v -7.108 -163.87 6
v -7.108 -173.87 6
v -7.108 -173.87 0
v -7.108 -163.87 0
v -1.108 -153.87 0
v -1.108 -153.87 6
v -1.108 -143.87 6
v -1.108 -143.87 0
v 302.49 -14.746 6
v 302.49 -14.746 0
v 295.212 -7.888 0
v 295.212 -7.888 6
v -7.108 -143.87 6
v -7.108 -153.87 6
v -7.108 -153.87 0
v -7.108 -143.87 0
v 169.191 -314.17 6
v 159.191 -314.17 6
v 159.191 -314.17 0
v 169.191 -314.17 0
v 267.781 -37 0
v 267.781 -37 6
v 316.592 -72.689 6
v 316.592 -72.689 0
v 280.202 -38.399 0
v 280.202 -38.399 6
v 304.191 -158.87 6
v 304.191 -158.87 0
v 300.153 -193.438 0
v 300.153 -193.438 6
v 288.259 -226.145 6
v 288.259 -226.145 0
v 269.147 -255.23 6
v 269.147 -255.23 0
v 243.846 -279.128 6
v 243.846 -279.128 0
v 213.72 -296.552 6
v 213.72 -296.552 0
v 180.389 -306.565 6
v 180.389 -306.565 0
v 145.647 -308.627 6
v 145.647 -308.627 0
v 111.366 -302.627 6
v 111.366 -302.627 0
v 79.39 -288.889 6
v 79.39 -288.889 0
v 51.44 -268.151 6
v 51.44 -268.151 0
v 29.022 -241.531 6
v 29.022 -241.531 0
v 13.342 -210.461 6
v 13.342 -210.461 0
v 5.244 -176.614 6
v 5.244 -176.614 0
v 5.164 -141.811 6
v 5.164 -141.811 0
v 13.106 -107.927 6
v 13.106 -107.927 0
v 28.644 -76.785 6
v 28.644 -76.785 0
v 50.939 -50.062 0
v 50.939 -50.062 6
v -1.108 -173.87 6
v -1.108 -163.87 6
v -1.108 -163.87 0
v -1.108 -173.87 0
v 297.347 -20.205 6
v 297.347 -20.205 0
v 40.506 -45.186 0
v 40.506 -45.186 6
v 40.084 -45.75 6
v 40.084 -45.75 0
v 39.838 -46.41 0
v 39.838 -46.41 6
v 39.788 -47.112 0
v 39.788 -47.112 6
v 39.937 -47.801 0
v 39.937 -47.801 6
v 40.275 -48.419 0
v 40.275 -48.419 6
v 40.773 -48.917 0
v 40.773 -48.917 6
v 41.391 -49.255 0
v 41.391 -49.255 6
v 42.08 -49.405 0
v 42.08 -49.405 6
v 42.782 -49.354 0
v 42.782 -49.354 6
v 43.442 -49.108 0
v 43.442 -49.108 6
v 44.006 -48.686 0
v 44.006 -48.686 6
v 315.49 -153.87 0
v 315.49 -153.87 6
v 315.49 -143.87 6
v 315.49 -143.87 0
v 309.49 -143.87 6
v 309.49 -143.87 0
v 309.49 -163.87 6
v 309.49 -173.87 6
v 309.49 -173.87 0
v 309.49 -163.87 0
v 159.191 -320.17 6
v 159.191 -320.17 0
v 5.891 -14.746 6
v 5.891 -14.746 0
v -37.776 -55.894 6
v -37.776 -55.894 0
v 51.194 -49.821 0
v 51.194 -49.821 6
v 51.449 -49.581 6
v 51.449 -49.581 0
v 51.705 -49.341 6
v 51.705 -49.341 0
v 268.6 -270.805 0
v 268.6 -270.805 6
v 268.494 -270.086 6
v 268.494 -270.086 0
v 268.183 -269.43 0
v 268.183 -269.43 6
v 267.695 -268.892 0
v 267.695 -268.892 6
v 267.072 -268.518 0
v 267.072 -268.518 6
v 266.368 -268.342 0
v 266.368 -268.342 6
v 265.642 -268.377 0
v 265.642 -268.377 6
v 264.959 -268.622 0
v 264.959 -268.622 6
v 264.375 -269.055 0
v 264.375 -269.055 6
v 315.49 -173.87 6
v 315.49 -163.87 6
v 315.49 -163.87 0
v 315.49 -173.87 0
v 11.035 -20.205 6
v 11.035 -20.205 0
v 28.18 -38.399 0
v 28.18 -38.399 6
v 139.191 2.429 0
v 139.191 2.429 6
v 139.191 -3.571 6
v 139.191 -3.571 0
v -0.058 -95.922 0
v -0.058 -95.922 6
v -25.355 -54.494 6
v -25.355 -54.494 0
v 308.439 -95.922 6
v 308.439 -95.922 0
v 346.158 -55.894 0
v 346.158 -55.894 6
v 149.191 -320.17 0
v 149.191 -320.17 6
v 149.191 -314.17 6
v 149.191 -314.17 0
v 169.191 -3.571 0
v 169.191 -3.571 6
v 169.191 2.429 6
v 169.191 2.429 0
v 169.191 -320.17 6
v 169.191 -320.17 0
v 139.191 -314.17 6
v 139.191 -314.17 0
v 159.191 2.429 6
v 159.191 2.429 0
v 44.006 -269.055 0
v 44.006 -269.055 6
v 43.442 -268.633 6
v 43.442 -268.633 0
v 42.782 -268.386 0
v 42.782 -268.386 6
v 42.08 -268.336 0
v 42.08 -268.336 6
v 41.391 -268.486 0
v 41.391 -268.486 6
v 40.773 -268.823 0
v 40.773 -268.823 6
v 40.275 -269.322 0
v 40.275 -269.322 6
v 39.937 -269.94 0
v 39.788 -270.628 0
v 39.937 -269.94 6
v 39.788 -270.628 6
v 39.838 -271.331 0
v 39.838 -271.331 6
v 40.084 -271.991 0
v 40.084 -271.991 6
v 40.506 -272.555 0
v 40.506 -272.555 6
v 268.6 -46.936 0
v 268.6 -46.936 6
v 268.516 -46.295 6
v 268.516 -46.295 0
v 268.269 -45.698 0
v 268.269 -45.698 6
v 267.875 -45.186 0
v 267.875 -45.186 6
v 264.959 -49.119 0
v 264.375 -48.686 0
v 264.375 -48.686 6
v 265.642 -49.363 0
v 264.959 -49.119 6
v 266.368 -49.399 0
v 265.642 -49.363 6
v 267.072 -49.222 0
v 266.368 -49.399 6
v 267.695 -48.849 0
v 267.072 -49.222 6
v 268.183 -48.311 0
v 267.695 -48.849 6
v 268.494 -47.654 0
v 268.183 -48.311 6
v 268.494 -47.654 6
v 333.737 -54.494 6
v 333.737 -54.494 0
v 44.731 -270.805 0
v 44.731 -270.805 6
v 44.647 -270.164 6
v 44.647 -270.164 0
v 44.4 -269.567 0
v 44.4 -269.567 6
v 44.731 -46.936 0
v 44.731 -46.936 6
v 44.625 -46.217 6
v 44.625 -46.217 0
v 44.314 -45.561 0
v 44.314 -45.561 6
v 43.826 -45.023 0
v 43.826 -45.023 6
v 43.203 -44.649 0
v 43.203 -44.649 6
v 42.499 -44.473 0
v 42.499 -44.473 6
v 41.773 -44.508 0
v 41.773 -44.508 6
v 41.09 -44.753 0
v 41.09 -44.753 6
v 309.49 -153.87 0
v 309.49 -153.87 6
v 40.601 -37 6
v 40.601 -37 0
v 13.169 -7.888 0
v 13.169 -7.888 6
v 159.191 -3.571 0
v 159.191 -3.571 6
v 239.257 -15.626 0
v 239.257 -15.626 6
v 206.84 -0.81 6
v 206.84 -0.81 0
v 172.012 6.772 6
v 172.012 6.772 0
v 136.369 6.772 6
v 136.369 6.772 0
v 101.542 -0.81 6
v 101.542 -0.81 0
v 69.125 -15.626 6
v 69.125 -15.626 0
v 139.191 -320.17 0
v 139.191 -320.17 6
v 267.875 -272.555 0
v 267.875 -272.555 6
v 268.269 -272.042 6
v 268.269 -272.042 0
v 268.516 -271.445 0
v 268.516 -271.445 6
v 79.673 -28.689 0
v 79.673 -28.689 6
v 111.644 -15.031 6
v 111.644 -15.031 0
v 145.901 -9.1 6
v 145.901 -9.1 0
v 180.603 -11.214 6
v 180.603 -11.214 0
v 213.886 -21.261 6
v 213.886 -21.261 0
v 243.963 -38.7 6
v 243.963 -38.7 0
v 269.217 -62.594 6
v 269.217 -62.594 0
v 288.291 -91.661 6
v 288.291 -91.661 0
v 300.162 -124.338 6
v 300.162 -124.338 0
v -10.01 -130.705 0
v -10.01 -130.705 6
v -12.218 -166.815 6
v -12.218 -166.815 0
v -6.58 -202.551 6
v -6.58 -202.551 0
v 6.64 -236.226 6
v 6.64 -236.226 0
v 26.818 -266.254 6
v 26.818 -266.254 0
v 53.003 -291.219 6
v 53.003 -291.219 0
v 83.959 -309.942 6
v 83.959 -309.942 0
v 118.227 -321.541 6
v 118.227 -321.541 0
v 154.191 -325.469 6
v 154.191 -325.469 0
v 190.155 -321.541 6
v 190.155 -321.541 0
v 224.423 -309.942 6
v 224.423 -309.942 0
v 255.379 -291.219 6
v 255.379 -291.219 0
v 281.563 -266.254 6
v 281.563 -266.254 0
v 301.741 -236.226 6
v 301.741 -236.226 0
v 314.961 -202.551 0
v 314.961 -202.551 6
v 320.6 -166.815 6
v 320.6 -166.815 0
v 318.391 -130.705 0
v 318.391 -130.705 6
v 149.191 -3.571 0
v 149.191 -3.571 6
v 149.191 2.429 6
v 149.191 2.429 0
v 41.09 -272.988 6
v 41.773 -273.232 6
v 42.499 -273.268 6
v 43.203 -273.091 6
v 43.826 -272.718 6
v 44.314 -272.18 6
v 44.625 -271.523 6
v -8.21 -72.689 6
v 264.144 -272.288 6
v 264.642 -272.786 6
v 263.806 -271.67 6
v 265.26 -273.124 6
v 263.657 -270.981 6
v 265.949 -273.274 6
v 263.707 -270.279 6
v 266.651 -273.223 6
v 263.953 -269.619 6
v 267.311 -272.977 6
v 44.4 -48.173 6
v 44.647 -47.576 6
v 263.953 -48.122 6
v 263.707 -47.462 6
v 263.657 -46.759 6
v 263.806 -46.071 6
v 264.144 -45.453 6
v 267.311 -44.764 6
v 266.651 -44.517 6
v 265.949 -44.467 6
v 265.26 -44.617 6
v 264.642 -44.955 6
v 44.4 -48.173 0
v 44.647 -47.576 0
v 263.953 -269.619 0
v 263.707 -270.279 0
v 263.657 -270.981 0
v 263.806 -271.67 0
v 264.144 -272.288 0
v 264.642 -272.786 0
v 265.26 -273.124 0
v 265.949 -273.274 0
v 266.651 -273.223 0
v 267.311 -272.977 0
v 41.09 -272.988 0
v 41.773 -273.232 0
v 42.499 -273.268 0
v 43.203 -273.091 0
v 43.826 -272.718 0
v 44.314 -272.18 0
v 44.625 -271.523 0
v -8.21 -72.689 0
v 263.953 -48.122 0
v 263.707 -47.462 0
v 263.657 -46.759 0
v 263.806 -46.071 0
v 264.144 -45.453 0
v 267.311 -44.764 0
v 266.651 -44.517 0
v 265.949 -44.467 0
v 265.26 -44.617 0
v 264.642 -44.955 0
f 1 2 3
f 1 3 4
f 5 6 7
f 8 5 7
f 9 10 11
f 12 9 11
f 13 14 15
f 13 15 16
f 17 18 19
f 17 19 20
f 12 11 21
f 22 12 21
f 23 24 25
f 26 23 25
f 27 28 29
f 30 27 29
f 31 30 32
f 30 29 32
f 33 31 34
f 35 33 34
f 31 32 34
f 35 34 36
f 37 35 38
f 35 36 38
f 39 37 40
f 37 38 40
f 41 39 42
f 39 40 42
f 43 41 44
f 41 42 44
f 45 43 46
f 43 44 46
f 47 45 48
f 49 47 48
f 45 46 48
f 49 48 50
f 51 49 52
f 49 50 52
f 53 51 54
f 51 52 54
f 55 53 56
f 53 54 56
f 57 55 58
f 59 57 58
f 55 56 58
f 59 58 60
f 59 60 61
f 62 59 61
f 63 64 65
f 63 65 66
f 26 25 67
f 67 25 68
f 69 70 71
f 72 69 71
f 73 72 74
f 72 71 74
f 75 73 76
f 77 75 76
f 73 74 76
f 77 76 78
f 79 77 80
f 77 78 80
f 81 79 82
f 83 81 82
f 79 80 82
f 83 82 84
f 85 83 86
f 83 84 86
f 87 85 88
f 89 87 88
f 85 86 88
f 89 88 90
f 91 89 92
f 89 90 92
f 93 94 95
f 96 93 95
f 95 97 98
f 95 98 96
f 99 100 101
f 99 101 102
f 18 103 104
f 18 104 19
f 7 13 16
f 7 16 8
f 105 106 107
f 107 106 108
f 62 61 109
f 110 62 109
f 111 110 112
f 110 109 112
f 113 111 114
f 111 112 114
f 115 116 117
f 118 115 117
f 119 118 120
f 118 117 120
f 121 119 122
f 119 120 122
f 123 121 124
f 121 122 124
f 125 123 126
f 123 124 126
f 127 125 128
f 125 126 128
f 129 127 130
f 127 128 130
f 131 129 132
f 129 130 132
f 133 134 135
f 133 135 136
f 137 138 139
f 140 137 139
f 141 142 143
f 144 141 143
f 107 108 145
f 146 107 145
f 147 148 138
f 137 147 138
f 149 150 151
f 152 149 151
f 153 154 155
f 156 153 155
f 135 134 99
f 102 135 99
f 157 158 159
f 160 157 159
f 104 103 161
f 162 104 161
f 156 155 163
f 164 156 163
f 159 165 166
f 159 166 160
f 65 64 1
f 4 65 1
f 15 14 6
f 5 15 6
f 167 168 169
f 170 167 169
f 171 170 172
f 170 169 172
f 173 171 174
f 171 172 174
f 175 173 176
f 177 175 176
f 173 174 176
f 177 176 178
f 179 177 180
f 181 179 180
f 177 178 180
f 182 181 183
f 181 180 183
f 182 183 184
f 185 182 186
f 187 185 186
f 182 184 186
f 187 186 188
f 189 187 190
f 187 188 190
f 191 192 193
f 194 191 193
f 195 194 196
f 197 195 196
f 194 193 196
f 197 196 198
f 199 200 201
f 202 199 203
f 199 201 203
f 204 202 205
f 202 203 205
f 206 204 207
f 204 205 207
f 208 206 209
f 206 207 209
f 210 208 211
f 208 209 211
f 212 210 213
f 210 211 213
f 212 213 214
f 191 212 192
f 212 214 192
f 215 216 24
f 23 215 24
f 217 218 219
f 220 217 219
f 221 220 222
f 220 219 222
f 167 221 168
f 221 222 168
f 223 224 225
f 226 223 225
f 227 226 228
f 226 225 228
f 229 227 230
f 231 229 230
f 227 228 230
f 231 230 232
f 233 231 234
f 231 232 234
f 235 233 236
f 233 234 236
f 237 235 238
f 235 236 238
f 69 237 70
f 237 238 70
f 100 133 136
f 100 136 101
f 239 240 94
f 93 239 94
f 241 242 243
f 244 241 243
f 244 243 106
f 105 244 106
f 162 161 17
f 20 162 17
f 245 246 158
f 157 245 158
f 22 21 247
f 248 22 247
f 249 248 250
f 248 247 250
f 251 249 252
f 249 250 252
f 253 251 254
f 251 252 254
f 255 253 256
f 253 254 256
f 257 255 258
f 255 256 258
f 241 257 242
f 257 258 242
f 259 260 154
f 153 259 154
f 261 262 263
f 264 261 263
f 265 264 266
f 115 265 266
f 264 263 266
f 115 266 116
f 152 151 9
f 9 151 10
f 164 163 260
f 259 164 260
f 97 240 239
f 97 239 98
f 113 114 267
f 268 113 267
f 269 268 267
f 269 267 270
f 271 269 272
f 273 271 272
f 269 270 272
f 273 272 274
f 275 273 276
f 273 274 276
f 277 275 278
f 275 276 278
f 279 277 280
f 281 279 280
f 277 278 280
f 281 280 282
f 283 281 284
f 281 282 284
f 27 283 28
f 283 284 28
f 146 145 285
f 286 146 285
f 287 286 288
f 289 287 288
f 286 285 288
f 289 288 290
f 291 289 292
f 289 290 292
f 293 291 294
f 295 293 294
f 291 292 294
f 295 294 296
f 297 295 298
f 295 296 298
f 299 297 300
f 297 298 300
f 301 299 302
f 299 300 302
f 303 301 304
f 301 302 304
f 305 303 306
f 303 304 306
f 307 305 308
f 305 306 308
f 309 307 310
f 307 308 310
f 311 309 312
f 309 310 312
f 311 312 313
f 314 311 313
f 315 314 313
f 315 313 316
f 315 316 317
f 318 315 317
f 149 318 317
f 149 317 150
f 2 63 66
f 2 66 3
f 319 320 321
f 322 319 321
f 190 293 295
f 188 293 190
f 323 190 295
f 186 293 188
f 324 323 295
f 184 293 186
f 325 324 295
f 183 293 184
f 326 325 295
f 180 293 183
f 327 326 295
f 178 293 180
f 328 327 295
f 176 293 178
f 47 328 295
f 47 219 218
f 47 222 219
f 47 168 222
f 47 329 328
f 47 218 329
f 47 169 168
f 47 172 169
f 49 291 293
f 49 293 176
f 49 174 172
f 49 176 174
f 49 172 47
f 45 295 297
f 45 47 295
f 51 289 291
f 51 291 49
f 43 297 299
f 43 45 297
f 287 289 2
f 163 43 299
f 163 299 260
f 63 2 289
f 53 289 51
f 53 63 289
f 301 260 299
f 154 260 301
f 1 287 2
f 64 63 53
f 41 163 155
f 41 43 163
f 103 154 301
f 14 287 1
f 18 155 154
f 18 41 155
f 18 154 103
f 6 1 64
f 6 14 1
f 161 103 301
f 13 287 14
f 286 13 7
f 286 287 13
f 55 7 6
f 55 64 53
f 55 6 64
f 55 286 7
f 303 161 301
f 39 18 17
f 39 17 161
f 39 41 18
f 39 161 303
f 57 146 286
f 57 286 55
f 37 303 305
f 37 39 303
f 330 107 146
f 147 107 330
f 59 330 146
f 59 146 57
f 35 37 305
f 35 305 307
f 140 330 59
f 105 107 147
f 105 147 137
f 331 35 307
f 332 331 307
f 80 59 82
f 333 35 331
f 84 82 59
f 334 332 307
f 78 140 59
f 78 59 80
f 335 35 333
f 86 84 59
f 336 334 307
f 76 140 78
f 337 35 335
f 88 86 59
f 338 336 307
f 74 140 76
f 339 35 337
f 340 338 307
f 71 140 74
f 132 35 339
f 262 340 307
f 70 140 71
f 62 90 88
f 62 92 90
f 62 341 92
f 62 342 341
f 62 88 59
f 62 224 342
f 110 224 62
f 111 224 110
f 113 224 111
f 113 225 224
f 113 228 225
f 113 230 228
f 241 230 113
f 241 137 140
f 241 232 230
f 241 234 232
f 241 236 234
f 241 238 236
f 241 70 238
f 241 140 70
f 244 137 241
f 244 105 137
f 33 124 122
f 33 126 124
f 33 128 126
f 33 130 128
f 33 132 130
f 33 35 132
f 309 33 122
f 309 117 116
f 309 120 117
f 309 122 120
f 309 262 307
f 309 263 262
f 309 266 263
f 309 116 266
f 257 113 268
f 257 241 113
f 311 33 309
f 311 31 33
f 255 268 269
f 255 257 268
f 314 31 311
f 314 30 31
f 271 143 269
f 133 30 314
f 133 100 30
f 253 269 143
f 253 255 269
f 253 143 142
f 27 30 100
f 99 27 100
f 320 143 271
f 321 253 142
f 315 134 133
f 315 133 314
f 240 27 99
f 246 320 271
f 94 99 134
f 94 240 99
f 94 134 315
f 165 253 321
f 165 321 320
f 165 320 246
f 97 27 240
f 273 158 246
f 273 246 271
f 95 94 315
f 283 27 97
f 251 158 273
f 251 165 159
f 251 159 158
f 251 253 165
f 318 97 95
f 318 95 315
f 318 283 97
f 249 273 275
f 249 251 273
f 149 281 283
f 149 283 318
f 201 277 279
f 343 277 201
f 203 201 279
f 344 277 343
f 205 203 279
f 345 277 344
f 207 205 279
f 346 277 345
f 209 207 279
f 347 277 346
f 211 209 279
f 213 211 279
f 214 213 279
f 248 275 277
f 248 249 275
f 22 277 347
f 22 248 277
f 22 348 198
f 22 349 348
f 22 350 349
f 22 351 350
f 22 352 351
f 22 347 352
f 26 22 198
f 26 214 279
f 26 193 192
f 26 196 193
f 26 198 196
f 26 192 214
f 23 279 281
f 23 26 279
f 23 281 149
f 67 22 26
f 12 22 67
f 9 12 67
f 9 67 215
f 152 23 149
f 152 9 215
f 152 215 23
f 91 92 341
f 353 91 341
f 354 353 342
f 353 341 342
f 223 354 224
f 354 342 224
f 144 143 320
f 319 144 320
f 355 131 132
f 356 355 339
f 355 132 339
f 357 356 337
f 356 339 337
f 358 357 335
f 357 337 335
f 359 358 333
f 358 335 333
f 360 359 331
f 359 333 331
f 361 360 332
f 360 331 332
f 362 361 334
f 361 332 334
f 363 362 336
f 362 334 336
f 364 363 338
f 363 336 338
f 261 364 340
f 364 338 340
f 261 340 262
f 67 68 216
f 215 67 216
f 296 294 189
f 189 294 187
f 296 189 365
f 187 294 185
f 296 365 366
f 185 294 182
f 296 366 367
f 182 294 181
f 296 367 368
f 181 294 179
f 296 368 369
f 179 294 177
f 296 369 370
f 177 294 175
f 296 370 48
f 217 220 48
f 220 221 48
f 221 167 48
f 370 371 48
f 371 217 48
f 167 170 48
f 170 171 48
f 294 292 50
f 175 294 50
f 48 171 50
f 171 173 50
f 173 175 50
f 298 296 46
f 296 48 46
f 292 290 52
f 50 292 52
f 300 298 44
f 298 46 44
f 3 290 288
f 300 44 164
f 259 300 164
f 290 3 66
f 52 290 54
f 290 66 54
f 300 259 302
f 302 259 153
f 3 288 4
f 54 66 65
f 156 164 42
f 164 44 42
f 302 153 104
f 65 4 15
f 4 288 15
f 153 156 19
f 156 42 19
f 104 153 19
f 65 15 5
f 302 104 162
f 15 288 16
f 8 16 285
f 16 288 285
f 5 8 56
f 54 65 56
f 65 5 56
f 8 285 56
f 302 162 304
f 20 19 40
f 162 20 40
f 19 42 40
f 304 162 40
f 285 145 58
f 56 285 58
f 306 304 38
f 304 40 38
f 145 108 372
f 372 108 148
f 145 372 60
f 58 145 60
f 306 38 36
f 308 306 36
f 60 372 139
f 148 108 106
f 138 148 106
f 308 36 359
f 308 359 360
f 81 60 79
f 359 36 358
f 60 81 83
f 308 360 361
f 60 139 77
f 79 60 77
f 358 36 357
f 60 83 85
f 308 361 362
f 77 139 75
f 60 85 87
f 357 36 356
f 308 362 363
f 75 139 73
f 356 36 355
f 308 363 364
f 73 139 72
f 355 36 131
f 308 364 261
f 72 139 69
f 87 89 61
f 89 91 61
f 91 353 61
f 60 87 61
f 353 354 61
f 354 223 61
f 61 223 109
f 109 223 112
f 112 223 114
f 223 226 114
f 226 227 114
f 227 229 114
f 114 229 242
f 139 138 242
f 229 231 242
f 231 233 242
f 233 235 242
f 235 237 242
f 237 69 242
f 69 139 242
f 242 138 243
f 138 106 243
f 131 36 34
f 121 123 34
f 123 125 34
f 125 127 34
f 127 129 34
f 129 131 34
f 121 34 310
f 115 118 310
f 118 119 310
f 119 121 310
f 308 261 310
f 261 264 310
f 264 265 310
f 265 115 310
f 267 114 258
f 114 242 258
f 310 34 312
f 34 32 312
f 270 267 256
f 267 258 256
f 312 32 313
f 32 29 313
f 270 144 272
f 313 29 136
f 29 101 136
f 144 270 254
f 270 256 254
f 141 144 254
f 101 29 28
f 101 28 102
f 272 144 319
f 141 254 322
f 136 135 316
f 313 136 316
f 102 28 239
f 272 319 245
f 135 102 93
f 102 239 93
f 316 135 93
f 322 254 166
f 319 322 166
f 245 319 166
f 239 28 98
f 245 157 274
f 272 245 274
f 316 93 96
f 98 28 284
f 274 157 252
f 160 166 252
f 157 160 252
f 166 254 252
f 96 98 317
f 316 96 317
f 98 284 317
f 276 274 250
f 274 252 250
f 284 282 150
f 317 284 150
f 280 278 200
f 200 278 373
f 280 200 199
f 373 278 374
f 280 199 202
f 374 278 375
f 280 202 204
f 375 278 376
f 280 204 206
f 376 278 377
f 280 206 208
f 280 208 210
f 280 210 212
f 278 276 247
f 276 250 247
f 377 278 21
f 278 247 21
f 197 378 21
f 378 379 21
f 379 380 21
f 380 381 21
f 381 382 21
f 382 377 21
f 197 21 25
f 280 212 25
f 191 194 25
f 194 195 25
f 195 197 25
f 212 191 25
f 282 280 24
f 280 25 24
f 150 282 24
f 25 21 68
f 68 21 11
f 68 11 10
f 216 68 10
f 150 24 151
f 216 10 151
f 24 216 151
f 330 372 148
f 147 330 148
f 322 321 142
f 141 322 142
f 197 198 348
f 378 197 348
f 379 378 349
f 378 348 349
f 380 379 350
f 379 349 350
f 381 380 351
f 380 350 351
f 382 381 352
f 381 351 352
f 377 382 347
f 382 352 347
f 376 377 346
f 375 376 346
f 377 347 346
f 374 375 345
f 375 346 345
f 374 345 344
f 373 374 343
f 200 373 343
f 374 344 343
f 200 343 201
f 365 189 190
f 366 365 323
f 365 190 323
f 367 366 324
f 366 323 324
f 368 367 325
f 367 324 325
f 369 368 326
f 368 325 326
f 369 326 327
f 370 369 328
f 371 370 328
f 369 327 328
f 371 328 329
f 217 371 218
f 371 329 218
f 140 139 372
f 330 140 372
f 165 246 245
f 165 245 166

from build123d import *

# Parameters (mm, degrees)
SALIENTE_EXTRUIR1_DEPTH = 6
CROQUIS2_W              = 10
CROQUIS2_H              = 6
CROQUIS2_W_2            = 6
CROQUIS2_H_2            = 10
CORTAR_EXTRUIR1_DEPTH   = 10


with BuildPart() as part:
    # Croquis1 → Saliente-Extruir1 (new body)
    with BuildSketch(Plane.XY):
        with BuildLine():
            ThreePointArc((267.780622857, -36.999917491), (154.190797134, 7.728122029), (40.600971411, -36.999917491))
            Line((40.600971411, -36.999917491), (13.169180469, -7.88811841))
            Line((13.169180469, -7.88811841), (5.891230699, -14.746066146))
            Line((5.891230699, -14.746066146), (-37.776467922, -55.893752559))
            Line((-37.776467922, -55.893752559), (-0.057755376, -95.922476295))
            ThreePointArc((-0.057755376, -95.922476295), (154.190797134, -325.468820804), (308.439349644, -95.922476295))
            Line((308.439349644, -95.922476295), (346.15806219, -55.893752559))
            Line((346.15806219, -55.893752559), (302.490363569, -14.746066146))
            Line((302.490363569, -14.746066146), (295.212413799, -7.88811841))
            Line((295.212413799, -7.88811841), (267.780622857, -36.999917491))
        make_face()
        with BuildLine():
            ThreePointArc((50.939396199, -50.062499464), (51.321581101, -49.701102835), (51.705030941, -49.341048614))
            ThreePointArc((51.705030941, -49.341048614), (213.886421224, -21.26063874), (304.190797134, -158.870349387))
            ThreePointArc((304.190797134, -158.870349387), (94.978087942, -296.688545102), (50.939396199, -50.062499464))
        make_face(mode=Mode.SUBTRACT)
        Polygon((-25.35505735, -54.494267151), (11.034691501, -20.204528474), (28.17956084, -38.399402899), (-8.210188011, -72.689141577), align=None, mode=Mode.SUBTRACT)
        Polygon((316.591782279, -72.689141577), (280.202033428, -38.399402899), (297.346902767, -20.204528474), (333.736651618, -54.494267151), align=None, mode=Mode.SUBTRACT)
    extrude(amount=SALIENTE_EXTRUIR1_DEPTH)

    # Croquis2 → Cortar-Extruir1 (cut)
    with BuildSketch(Plane.XY.offset(6)):
        Polygon((139.190797134, -3.571113679), (149.190797134, -3.571113679), (149.190797134, -0.571113679), (149.190797134, 2.428886321), (139.190797134, 2.428886321), align=None)
        with Locations((164.190797134, -0.571113679)):
            Rectangle(CROQUIS2_W, CROQUIS2_H)
        with Locations((312.490032842, -148.870349387)):
            Rectangle(CROQUIS2_W_2, CROQUIS2_H_2)
        Polygon((312.490032842, -163.870349387), (315.490032842, -163.870349387), (315.490032842, -173.870349387), (309.490032842, -173.870349387), (309.490032842, -163.870349387), align=None)
        with Locations((164.190797134, -317.169585095)):
            Rectangle(CROQUIS2_W, CROQUIS2_H)
        Polygon((149.190797134, -317.169585095), (149.190797134, -314.169585095), (139.190797134, -314.169585095), (139.190797134, -320.169585095), (149.190797134, -320.169585095), align=None)
        with Locations((-4.108438574, -148.870349387)):
            Rectangle(CROQUIS2_W_2, CROQUIS2_H_2)
        Polygon((-7.108438574, -173.870349387), (-7.108438574, -163.870349387), (-4.108438574, -163.870349387), (-1.108438574, -163.870349387), (-1.108438574, -173.870349387), align=None)
        with BuildLine():
            ThreePointArc((40.506244825, -45.185797078), (40.506244825, -48.685975645), (44.006423391, -48.685975645))
            Line((44.006423391, -48.685975645), (40.506244825, -45.185797078))
        make_face()
        with BuildLine():
            Line((40.506244825, -45.185797078), (44.006423391, -48.685975645))
            ThreePointArc((44.006423391, -48.685975645), (44.542935951, -47.883027856), (44.731334108, -46.935886361))
            ThreePointArc((44.731334108, -46.935886361), (43.203475603, -44.649284518), (40.506244825, -45.185797078))
        make_face()
        with BuildLine():
            ThreePointArc((267.875349443, -45.185797078), (264.375170876, -45.185797078), (264.375170876, -48.685975645))
            Line((264.375170876, -48.685975645), (267.875349443, -45.185797078))
        make_face()
        with BuildLine():
            Line((267.875349443, -45.185797078), (264.375170876, -48.685975645))
            ThreePointArc((264.375170876, -48.685975645), (267.072401655, -49.222488204), (268.60026016, -46.935886361))
            ThreePointArc((268.60026016, -46.935886361), (268.411862003, -45.988744866), (267.875349443, -45.185797078))
        make_face()
        with BuildLine():
            ThreePointArc((268.60026016, -270.804812413), (267.072401655, -268.51821057), (264.375170876, -269.05472313))
            Line((264.375170876, -269.05472313), (267.875349443, -272.554901696))
            ThreePointArc((267.875349443, -272.554901696), (268.411862003, -271.751953908), (268.60026016, -270.804812413))
        make_face()
        with BuildLine():
            Line((267.875349443, -272.554901696), (264.375170876, -269.05472313))
            ThreePointArc((264.375170876, -269.05472313), (264.375170876, -272.554901696), (267.875349443, -272.554901696))
        make_face()
        with BuildLine():
            ThreePointArc((44.731334108, -270.804812413), (44.542935951, -269.857670918), (44.006423391, -269.05472313))
            Line((44.006423391, -269.05472313), (40.506244825, -272.554901696))
            ThreePointArc((40.506244825, -272.554901696), (43.203475603, -273.091414256), (44.731334108, -270.804812413))
        make_face()
        with BuildLine():
            Line((40.506244825, -272.554901696), (44.006423391, -269.05472313))
            ThreePointArc((44.006423391, -269.05472313), (40.506244825, -269.05472313), (40.506244825, -272.554901696))
        make_face()
    extrude(amount=-CORTAR_EXTRUIR1_DEPTH, mode=Mode.SUBTRACT)


solid = part.part
